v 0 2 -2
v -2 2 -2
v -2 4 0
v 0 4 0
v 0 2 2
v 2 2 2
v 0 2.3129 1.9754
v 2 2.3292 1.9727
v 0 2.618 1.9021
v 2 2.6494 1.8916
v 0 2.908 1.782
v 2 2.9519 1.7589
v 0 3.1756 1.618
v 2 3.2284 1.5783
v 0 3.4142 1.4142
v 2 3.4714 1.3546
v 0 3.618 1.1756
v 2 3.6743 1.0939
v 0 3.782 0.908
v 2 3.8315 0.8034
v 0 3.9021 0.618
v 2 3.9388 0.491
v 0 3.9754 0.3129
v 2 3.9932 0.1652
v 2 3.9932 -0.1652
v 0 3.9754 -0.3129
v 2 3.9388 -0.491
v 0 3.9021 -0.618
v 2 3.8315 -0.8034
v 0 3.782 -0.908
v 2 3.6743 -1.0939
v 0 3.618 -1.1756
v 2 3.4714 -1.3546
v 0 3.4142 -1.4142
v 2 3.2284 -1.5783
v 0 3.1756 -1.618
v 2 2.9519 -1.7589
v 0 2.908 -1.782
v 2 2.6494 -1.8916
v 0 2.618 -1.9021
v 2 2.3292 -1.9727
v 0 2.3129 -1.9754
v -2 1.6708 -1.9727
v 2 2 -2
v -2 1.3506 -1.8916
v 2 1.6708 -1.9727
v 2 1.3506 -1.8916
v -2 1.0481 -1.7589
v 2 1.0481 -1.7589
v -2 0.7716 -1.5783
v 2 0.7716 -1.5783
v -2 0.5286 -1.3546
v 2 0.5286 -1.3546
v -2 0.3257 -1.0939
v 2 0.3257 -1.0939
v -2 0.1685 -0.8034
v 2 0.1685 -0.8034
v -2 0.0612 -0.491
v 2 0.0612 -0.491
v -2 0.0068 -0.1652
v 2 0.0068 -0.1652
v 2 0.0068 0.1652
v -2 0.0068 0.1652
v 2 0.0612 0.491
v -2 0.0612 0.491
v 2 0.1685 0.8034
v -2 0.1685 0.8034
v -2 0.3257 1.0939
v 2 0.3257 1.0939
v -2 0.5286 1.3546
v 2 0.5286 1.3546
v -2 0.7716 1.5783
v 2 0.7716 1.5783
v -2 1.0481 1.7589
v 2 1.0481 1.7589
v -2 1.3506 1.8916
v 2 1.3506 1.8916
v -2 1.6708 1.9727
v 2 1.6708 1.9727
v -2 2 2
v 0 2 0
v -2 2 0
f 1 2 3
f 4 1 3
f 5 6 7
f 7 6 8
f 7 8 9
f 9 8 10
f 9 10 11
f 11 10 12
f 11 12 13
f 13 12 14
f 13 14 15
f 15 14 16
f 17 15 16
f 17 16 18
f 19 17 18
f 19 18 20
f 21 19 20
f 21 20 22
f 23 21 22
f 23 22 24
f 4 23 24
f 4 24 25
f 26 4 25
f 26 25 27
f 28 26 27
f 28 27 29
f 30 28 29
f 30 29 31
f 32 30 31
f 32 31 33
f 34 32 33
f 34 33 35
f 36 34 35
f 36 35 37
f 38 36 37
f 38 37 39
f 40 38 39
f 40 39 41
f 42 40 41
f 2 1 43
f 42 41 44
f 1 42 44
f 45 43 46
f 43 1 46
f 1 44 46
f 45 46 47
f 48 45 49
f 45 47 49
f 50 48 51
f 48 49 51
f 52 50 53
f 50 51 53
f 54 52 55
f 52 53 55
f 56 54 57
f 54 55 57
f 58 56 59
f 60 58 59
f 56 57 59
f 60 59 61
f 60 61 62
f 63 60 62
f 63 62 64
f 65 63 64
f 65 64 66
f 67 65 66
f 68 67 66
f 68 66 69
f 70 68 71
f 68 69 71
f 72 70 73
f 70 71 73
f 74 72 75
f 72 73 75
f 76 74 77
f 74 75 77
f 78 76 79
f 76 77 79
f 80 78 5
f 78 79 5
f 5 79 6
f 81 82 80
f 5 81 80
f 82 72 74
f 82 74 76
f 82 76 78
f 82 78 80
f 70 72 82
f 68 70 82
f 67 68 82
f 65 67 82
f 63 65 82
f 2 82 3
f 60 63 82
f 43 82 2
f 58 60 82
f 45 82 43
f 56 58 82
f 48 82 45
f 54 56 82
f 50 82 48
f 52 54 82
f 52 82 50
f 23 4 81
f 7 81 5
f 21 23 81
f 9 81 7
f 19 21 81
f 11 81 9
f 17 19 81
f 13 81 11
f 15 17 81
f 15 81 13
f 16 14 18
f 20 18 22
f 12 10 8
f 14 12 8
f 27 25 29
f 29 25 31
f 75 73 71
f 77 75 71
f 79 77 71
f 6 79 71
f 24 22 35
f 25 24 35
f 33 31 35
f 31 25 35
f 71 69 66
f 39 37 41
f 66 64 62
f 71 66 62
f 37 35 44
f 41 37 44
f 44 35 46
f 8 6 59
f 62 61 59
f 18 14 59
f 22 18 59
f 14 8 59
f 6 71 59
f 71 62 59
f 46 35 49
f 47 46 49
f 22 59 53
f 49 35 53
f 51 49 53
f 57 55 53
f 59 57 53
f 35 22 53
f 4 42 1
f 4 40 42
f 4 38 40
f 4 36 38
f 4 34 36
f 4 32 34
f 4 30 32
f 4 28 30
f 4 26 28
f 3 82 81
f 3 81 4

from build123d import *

# Parameters (mm, degrees)
SKETCH1_W           = 4
SKETCH1_H           = 4
BOSS_EXTRUDE1_DEPTH = 4
SKETCH2_W           = 2
SKETCH2_H           = 2
CUT_EXTRUDE1_DEPTH  = 2
SKETCH3_R           = 2.828427125
SKETCH3_R_2         = 2
CUT_EXTRUDE2_DEPTH  = 30


with BuildPart() as part:
    # Sketch1 → Boss-Extrude1 (new body)
    with BuildSketch(Plane(origin=(0, 0, 0), x_dir=(1, 0, 0), z_dir=(0, 1, 0))):
        Rectangle(SKETCH1_W, SKETCH1_H)
    extrude(amount=BOSS_EXTRUDE1_DEPTH)

    # Sketch2 → Cut-Extrude1 (cut)
    with BuildSketch(Plane.ZY.offset(2)):
        Polygon((-2, 4), (-2, 2), (0, 4), align=None)
        with Locations((1, 3)):
            Rectangle(SKETCH2_W, SKETCH2_H)
    extrude(amount=-CUT_EXTRUDE1_DEPTH, mode=Mode.SUBTRACT)

    # Sketch3 → Cut-Extrude2 (cut, symmetric)
    with BuildSketch(Plane.ZY):
        with Locations((0, 2)):
            Circle(SKETCH3_R)
        with Locations((0, 2)):
            Circle(SKETCH3_R_2, mode=Mode.SUBTRACT)
    extrude(amount=CUT_EXTRUDE2_DEPTH, both=True, mode=Mode.SUBTRACT)


solid = part.part
